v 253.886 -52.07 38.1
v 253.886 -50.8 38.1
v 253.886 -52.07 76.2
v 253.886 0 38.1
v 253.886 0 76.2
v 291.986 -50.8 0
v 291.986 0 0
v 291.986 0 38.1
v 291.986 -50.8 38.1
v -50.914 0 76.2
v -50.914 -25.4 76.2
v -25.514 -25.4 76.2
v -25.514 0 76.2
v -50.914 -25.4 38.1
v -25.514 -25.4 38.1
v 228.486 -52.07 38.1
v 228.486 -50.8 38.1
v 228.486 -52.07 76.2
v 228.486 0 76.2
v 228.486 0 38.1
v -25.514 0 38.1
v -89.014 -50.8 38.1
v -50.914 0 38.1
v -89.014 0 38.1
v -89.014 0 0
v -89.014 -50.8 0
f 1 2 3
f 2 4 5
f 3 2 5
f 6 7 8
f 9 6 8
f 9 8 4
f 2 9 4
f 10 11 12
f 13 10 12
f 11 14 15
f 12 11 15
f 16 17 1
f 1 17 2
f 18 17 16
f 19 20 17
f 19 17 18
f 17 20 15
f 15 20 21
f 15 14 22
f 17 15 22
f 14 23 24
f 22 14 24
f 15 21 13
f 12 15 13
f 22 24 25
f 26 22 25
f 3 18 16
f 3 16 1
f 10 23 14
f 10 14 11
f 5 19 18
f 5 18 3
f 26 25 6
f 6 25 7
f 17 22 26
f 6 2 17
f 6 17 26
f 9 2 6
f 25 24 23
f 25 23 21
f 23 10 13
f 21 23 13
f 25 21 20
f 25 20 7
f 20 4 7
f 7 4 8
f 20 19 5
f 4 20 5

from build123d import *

# Parameters (mm, degrees)
F0_W     = 25.4
F0_H     = 38.1
F1_DEPTH = 50.8
F2_DEPTH = 25.4
F3_W     = 25.4
F3_H     = 38.1
F4_DEPTH = 1.27


with BuildPart() as f1:
    # F0 (on Front) → F1 (new body)
    with BuildSketch(Plane.XZ):
        Polygon((-50.914204, 38.1), (-89.014204, 38.1), (-89.014204, 0), (291.985796, 0), (291.985796, 38.1), (253.885796, 38.1), (228.485796, 38.1), (-25.514204, 38.1), align=None)
        with Locations((241.185796, 57.15)):
            Rectangle(F0_W, F0_H)
    extrude(amount=F1_DEPTH)

    # F0 (on Front) → F2 (join)
    with BuildSketch(Plane.XZ):
        with Locations((-38.214204, 57.15)):
            Rectangle(F0_W, F0_H)
    extrude(amount=F2_DEPTH)

    # F3 (on face) → F4 (join)
    with BuildSketch(Plane.XZ.offset(50.8)):
        with Locations((241.185796, 57.15)):
            Rectangle(F3_W, F3_H)
    extrude(amount=F4_DEPTH)


solid = f1.part
